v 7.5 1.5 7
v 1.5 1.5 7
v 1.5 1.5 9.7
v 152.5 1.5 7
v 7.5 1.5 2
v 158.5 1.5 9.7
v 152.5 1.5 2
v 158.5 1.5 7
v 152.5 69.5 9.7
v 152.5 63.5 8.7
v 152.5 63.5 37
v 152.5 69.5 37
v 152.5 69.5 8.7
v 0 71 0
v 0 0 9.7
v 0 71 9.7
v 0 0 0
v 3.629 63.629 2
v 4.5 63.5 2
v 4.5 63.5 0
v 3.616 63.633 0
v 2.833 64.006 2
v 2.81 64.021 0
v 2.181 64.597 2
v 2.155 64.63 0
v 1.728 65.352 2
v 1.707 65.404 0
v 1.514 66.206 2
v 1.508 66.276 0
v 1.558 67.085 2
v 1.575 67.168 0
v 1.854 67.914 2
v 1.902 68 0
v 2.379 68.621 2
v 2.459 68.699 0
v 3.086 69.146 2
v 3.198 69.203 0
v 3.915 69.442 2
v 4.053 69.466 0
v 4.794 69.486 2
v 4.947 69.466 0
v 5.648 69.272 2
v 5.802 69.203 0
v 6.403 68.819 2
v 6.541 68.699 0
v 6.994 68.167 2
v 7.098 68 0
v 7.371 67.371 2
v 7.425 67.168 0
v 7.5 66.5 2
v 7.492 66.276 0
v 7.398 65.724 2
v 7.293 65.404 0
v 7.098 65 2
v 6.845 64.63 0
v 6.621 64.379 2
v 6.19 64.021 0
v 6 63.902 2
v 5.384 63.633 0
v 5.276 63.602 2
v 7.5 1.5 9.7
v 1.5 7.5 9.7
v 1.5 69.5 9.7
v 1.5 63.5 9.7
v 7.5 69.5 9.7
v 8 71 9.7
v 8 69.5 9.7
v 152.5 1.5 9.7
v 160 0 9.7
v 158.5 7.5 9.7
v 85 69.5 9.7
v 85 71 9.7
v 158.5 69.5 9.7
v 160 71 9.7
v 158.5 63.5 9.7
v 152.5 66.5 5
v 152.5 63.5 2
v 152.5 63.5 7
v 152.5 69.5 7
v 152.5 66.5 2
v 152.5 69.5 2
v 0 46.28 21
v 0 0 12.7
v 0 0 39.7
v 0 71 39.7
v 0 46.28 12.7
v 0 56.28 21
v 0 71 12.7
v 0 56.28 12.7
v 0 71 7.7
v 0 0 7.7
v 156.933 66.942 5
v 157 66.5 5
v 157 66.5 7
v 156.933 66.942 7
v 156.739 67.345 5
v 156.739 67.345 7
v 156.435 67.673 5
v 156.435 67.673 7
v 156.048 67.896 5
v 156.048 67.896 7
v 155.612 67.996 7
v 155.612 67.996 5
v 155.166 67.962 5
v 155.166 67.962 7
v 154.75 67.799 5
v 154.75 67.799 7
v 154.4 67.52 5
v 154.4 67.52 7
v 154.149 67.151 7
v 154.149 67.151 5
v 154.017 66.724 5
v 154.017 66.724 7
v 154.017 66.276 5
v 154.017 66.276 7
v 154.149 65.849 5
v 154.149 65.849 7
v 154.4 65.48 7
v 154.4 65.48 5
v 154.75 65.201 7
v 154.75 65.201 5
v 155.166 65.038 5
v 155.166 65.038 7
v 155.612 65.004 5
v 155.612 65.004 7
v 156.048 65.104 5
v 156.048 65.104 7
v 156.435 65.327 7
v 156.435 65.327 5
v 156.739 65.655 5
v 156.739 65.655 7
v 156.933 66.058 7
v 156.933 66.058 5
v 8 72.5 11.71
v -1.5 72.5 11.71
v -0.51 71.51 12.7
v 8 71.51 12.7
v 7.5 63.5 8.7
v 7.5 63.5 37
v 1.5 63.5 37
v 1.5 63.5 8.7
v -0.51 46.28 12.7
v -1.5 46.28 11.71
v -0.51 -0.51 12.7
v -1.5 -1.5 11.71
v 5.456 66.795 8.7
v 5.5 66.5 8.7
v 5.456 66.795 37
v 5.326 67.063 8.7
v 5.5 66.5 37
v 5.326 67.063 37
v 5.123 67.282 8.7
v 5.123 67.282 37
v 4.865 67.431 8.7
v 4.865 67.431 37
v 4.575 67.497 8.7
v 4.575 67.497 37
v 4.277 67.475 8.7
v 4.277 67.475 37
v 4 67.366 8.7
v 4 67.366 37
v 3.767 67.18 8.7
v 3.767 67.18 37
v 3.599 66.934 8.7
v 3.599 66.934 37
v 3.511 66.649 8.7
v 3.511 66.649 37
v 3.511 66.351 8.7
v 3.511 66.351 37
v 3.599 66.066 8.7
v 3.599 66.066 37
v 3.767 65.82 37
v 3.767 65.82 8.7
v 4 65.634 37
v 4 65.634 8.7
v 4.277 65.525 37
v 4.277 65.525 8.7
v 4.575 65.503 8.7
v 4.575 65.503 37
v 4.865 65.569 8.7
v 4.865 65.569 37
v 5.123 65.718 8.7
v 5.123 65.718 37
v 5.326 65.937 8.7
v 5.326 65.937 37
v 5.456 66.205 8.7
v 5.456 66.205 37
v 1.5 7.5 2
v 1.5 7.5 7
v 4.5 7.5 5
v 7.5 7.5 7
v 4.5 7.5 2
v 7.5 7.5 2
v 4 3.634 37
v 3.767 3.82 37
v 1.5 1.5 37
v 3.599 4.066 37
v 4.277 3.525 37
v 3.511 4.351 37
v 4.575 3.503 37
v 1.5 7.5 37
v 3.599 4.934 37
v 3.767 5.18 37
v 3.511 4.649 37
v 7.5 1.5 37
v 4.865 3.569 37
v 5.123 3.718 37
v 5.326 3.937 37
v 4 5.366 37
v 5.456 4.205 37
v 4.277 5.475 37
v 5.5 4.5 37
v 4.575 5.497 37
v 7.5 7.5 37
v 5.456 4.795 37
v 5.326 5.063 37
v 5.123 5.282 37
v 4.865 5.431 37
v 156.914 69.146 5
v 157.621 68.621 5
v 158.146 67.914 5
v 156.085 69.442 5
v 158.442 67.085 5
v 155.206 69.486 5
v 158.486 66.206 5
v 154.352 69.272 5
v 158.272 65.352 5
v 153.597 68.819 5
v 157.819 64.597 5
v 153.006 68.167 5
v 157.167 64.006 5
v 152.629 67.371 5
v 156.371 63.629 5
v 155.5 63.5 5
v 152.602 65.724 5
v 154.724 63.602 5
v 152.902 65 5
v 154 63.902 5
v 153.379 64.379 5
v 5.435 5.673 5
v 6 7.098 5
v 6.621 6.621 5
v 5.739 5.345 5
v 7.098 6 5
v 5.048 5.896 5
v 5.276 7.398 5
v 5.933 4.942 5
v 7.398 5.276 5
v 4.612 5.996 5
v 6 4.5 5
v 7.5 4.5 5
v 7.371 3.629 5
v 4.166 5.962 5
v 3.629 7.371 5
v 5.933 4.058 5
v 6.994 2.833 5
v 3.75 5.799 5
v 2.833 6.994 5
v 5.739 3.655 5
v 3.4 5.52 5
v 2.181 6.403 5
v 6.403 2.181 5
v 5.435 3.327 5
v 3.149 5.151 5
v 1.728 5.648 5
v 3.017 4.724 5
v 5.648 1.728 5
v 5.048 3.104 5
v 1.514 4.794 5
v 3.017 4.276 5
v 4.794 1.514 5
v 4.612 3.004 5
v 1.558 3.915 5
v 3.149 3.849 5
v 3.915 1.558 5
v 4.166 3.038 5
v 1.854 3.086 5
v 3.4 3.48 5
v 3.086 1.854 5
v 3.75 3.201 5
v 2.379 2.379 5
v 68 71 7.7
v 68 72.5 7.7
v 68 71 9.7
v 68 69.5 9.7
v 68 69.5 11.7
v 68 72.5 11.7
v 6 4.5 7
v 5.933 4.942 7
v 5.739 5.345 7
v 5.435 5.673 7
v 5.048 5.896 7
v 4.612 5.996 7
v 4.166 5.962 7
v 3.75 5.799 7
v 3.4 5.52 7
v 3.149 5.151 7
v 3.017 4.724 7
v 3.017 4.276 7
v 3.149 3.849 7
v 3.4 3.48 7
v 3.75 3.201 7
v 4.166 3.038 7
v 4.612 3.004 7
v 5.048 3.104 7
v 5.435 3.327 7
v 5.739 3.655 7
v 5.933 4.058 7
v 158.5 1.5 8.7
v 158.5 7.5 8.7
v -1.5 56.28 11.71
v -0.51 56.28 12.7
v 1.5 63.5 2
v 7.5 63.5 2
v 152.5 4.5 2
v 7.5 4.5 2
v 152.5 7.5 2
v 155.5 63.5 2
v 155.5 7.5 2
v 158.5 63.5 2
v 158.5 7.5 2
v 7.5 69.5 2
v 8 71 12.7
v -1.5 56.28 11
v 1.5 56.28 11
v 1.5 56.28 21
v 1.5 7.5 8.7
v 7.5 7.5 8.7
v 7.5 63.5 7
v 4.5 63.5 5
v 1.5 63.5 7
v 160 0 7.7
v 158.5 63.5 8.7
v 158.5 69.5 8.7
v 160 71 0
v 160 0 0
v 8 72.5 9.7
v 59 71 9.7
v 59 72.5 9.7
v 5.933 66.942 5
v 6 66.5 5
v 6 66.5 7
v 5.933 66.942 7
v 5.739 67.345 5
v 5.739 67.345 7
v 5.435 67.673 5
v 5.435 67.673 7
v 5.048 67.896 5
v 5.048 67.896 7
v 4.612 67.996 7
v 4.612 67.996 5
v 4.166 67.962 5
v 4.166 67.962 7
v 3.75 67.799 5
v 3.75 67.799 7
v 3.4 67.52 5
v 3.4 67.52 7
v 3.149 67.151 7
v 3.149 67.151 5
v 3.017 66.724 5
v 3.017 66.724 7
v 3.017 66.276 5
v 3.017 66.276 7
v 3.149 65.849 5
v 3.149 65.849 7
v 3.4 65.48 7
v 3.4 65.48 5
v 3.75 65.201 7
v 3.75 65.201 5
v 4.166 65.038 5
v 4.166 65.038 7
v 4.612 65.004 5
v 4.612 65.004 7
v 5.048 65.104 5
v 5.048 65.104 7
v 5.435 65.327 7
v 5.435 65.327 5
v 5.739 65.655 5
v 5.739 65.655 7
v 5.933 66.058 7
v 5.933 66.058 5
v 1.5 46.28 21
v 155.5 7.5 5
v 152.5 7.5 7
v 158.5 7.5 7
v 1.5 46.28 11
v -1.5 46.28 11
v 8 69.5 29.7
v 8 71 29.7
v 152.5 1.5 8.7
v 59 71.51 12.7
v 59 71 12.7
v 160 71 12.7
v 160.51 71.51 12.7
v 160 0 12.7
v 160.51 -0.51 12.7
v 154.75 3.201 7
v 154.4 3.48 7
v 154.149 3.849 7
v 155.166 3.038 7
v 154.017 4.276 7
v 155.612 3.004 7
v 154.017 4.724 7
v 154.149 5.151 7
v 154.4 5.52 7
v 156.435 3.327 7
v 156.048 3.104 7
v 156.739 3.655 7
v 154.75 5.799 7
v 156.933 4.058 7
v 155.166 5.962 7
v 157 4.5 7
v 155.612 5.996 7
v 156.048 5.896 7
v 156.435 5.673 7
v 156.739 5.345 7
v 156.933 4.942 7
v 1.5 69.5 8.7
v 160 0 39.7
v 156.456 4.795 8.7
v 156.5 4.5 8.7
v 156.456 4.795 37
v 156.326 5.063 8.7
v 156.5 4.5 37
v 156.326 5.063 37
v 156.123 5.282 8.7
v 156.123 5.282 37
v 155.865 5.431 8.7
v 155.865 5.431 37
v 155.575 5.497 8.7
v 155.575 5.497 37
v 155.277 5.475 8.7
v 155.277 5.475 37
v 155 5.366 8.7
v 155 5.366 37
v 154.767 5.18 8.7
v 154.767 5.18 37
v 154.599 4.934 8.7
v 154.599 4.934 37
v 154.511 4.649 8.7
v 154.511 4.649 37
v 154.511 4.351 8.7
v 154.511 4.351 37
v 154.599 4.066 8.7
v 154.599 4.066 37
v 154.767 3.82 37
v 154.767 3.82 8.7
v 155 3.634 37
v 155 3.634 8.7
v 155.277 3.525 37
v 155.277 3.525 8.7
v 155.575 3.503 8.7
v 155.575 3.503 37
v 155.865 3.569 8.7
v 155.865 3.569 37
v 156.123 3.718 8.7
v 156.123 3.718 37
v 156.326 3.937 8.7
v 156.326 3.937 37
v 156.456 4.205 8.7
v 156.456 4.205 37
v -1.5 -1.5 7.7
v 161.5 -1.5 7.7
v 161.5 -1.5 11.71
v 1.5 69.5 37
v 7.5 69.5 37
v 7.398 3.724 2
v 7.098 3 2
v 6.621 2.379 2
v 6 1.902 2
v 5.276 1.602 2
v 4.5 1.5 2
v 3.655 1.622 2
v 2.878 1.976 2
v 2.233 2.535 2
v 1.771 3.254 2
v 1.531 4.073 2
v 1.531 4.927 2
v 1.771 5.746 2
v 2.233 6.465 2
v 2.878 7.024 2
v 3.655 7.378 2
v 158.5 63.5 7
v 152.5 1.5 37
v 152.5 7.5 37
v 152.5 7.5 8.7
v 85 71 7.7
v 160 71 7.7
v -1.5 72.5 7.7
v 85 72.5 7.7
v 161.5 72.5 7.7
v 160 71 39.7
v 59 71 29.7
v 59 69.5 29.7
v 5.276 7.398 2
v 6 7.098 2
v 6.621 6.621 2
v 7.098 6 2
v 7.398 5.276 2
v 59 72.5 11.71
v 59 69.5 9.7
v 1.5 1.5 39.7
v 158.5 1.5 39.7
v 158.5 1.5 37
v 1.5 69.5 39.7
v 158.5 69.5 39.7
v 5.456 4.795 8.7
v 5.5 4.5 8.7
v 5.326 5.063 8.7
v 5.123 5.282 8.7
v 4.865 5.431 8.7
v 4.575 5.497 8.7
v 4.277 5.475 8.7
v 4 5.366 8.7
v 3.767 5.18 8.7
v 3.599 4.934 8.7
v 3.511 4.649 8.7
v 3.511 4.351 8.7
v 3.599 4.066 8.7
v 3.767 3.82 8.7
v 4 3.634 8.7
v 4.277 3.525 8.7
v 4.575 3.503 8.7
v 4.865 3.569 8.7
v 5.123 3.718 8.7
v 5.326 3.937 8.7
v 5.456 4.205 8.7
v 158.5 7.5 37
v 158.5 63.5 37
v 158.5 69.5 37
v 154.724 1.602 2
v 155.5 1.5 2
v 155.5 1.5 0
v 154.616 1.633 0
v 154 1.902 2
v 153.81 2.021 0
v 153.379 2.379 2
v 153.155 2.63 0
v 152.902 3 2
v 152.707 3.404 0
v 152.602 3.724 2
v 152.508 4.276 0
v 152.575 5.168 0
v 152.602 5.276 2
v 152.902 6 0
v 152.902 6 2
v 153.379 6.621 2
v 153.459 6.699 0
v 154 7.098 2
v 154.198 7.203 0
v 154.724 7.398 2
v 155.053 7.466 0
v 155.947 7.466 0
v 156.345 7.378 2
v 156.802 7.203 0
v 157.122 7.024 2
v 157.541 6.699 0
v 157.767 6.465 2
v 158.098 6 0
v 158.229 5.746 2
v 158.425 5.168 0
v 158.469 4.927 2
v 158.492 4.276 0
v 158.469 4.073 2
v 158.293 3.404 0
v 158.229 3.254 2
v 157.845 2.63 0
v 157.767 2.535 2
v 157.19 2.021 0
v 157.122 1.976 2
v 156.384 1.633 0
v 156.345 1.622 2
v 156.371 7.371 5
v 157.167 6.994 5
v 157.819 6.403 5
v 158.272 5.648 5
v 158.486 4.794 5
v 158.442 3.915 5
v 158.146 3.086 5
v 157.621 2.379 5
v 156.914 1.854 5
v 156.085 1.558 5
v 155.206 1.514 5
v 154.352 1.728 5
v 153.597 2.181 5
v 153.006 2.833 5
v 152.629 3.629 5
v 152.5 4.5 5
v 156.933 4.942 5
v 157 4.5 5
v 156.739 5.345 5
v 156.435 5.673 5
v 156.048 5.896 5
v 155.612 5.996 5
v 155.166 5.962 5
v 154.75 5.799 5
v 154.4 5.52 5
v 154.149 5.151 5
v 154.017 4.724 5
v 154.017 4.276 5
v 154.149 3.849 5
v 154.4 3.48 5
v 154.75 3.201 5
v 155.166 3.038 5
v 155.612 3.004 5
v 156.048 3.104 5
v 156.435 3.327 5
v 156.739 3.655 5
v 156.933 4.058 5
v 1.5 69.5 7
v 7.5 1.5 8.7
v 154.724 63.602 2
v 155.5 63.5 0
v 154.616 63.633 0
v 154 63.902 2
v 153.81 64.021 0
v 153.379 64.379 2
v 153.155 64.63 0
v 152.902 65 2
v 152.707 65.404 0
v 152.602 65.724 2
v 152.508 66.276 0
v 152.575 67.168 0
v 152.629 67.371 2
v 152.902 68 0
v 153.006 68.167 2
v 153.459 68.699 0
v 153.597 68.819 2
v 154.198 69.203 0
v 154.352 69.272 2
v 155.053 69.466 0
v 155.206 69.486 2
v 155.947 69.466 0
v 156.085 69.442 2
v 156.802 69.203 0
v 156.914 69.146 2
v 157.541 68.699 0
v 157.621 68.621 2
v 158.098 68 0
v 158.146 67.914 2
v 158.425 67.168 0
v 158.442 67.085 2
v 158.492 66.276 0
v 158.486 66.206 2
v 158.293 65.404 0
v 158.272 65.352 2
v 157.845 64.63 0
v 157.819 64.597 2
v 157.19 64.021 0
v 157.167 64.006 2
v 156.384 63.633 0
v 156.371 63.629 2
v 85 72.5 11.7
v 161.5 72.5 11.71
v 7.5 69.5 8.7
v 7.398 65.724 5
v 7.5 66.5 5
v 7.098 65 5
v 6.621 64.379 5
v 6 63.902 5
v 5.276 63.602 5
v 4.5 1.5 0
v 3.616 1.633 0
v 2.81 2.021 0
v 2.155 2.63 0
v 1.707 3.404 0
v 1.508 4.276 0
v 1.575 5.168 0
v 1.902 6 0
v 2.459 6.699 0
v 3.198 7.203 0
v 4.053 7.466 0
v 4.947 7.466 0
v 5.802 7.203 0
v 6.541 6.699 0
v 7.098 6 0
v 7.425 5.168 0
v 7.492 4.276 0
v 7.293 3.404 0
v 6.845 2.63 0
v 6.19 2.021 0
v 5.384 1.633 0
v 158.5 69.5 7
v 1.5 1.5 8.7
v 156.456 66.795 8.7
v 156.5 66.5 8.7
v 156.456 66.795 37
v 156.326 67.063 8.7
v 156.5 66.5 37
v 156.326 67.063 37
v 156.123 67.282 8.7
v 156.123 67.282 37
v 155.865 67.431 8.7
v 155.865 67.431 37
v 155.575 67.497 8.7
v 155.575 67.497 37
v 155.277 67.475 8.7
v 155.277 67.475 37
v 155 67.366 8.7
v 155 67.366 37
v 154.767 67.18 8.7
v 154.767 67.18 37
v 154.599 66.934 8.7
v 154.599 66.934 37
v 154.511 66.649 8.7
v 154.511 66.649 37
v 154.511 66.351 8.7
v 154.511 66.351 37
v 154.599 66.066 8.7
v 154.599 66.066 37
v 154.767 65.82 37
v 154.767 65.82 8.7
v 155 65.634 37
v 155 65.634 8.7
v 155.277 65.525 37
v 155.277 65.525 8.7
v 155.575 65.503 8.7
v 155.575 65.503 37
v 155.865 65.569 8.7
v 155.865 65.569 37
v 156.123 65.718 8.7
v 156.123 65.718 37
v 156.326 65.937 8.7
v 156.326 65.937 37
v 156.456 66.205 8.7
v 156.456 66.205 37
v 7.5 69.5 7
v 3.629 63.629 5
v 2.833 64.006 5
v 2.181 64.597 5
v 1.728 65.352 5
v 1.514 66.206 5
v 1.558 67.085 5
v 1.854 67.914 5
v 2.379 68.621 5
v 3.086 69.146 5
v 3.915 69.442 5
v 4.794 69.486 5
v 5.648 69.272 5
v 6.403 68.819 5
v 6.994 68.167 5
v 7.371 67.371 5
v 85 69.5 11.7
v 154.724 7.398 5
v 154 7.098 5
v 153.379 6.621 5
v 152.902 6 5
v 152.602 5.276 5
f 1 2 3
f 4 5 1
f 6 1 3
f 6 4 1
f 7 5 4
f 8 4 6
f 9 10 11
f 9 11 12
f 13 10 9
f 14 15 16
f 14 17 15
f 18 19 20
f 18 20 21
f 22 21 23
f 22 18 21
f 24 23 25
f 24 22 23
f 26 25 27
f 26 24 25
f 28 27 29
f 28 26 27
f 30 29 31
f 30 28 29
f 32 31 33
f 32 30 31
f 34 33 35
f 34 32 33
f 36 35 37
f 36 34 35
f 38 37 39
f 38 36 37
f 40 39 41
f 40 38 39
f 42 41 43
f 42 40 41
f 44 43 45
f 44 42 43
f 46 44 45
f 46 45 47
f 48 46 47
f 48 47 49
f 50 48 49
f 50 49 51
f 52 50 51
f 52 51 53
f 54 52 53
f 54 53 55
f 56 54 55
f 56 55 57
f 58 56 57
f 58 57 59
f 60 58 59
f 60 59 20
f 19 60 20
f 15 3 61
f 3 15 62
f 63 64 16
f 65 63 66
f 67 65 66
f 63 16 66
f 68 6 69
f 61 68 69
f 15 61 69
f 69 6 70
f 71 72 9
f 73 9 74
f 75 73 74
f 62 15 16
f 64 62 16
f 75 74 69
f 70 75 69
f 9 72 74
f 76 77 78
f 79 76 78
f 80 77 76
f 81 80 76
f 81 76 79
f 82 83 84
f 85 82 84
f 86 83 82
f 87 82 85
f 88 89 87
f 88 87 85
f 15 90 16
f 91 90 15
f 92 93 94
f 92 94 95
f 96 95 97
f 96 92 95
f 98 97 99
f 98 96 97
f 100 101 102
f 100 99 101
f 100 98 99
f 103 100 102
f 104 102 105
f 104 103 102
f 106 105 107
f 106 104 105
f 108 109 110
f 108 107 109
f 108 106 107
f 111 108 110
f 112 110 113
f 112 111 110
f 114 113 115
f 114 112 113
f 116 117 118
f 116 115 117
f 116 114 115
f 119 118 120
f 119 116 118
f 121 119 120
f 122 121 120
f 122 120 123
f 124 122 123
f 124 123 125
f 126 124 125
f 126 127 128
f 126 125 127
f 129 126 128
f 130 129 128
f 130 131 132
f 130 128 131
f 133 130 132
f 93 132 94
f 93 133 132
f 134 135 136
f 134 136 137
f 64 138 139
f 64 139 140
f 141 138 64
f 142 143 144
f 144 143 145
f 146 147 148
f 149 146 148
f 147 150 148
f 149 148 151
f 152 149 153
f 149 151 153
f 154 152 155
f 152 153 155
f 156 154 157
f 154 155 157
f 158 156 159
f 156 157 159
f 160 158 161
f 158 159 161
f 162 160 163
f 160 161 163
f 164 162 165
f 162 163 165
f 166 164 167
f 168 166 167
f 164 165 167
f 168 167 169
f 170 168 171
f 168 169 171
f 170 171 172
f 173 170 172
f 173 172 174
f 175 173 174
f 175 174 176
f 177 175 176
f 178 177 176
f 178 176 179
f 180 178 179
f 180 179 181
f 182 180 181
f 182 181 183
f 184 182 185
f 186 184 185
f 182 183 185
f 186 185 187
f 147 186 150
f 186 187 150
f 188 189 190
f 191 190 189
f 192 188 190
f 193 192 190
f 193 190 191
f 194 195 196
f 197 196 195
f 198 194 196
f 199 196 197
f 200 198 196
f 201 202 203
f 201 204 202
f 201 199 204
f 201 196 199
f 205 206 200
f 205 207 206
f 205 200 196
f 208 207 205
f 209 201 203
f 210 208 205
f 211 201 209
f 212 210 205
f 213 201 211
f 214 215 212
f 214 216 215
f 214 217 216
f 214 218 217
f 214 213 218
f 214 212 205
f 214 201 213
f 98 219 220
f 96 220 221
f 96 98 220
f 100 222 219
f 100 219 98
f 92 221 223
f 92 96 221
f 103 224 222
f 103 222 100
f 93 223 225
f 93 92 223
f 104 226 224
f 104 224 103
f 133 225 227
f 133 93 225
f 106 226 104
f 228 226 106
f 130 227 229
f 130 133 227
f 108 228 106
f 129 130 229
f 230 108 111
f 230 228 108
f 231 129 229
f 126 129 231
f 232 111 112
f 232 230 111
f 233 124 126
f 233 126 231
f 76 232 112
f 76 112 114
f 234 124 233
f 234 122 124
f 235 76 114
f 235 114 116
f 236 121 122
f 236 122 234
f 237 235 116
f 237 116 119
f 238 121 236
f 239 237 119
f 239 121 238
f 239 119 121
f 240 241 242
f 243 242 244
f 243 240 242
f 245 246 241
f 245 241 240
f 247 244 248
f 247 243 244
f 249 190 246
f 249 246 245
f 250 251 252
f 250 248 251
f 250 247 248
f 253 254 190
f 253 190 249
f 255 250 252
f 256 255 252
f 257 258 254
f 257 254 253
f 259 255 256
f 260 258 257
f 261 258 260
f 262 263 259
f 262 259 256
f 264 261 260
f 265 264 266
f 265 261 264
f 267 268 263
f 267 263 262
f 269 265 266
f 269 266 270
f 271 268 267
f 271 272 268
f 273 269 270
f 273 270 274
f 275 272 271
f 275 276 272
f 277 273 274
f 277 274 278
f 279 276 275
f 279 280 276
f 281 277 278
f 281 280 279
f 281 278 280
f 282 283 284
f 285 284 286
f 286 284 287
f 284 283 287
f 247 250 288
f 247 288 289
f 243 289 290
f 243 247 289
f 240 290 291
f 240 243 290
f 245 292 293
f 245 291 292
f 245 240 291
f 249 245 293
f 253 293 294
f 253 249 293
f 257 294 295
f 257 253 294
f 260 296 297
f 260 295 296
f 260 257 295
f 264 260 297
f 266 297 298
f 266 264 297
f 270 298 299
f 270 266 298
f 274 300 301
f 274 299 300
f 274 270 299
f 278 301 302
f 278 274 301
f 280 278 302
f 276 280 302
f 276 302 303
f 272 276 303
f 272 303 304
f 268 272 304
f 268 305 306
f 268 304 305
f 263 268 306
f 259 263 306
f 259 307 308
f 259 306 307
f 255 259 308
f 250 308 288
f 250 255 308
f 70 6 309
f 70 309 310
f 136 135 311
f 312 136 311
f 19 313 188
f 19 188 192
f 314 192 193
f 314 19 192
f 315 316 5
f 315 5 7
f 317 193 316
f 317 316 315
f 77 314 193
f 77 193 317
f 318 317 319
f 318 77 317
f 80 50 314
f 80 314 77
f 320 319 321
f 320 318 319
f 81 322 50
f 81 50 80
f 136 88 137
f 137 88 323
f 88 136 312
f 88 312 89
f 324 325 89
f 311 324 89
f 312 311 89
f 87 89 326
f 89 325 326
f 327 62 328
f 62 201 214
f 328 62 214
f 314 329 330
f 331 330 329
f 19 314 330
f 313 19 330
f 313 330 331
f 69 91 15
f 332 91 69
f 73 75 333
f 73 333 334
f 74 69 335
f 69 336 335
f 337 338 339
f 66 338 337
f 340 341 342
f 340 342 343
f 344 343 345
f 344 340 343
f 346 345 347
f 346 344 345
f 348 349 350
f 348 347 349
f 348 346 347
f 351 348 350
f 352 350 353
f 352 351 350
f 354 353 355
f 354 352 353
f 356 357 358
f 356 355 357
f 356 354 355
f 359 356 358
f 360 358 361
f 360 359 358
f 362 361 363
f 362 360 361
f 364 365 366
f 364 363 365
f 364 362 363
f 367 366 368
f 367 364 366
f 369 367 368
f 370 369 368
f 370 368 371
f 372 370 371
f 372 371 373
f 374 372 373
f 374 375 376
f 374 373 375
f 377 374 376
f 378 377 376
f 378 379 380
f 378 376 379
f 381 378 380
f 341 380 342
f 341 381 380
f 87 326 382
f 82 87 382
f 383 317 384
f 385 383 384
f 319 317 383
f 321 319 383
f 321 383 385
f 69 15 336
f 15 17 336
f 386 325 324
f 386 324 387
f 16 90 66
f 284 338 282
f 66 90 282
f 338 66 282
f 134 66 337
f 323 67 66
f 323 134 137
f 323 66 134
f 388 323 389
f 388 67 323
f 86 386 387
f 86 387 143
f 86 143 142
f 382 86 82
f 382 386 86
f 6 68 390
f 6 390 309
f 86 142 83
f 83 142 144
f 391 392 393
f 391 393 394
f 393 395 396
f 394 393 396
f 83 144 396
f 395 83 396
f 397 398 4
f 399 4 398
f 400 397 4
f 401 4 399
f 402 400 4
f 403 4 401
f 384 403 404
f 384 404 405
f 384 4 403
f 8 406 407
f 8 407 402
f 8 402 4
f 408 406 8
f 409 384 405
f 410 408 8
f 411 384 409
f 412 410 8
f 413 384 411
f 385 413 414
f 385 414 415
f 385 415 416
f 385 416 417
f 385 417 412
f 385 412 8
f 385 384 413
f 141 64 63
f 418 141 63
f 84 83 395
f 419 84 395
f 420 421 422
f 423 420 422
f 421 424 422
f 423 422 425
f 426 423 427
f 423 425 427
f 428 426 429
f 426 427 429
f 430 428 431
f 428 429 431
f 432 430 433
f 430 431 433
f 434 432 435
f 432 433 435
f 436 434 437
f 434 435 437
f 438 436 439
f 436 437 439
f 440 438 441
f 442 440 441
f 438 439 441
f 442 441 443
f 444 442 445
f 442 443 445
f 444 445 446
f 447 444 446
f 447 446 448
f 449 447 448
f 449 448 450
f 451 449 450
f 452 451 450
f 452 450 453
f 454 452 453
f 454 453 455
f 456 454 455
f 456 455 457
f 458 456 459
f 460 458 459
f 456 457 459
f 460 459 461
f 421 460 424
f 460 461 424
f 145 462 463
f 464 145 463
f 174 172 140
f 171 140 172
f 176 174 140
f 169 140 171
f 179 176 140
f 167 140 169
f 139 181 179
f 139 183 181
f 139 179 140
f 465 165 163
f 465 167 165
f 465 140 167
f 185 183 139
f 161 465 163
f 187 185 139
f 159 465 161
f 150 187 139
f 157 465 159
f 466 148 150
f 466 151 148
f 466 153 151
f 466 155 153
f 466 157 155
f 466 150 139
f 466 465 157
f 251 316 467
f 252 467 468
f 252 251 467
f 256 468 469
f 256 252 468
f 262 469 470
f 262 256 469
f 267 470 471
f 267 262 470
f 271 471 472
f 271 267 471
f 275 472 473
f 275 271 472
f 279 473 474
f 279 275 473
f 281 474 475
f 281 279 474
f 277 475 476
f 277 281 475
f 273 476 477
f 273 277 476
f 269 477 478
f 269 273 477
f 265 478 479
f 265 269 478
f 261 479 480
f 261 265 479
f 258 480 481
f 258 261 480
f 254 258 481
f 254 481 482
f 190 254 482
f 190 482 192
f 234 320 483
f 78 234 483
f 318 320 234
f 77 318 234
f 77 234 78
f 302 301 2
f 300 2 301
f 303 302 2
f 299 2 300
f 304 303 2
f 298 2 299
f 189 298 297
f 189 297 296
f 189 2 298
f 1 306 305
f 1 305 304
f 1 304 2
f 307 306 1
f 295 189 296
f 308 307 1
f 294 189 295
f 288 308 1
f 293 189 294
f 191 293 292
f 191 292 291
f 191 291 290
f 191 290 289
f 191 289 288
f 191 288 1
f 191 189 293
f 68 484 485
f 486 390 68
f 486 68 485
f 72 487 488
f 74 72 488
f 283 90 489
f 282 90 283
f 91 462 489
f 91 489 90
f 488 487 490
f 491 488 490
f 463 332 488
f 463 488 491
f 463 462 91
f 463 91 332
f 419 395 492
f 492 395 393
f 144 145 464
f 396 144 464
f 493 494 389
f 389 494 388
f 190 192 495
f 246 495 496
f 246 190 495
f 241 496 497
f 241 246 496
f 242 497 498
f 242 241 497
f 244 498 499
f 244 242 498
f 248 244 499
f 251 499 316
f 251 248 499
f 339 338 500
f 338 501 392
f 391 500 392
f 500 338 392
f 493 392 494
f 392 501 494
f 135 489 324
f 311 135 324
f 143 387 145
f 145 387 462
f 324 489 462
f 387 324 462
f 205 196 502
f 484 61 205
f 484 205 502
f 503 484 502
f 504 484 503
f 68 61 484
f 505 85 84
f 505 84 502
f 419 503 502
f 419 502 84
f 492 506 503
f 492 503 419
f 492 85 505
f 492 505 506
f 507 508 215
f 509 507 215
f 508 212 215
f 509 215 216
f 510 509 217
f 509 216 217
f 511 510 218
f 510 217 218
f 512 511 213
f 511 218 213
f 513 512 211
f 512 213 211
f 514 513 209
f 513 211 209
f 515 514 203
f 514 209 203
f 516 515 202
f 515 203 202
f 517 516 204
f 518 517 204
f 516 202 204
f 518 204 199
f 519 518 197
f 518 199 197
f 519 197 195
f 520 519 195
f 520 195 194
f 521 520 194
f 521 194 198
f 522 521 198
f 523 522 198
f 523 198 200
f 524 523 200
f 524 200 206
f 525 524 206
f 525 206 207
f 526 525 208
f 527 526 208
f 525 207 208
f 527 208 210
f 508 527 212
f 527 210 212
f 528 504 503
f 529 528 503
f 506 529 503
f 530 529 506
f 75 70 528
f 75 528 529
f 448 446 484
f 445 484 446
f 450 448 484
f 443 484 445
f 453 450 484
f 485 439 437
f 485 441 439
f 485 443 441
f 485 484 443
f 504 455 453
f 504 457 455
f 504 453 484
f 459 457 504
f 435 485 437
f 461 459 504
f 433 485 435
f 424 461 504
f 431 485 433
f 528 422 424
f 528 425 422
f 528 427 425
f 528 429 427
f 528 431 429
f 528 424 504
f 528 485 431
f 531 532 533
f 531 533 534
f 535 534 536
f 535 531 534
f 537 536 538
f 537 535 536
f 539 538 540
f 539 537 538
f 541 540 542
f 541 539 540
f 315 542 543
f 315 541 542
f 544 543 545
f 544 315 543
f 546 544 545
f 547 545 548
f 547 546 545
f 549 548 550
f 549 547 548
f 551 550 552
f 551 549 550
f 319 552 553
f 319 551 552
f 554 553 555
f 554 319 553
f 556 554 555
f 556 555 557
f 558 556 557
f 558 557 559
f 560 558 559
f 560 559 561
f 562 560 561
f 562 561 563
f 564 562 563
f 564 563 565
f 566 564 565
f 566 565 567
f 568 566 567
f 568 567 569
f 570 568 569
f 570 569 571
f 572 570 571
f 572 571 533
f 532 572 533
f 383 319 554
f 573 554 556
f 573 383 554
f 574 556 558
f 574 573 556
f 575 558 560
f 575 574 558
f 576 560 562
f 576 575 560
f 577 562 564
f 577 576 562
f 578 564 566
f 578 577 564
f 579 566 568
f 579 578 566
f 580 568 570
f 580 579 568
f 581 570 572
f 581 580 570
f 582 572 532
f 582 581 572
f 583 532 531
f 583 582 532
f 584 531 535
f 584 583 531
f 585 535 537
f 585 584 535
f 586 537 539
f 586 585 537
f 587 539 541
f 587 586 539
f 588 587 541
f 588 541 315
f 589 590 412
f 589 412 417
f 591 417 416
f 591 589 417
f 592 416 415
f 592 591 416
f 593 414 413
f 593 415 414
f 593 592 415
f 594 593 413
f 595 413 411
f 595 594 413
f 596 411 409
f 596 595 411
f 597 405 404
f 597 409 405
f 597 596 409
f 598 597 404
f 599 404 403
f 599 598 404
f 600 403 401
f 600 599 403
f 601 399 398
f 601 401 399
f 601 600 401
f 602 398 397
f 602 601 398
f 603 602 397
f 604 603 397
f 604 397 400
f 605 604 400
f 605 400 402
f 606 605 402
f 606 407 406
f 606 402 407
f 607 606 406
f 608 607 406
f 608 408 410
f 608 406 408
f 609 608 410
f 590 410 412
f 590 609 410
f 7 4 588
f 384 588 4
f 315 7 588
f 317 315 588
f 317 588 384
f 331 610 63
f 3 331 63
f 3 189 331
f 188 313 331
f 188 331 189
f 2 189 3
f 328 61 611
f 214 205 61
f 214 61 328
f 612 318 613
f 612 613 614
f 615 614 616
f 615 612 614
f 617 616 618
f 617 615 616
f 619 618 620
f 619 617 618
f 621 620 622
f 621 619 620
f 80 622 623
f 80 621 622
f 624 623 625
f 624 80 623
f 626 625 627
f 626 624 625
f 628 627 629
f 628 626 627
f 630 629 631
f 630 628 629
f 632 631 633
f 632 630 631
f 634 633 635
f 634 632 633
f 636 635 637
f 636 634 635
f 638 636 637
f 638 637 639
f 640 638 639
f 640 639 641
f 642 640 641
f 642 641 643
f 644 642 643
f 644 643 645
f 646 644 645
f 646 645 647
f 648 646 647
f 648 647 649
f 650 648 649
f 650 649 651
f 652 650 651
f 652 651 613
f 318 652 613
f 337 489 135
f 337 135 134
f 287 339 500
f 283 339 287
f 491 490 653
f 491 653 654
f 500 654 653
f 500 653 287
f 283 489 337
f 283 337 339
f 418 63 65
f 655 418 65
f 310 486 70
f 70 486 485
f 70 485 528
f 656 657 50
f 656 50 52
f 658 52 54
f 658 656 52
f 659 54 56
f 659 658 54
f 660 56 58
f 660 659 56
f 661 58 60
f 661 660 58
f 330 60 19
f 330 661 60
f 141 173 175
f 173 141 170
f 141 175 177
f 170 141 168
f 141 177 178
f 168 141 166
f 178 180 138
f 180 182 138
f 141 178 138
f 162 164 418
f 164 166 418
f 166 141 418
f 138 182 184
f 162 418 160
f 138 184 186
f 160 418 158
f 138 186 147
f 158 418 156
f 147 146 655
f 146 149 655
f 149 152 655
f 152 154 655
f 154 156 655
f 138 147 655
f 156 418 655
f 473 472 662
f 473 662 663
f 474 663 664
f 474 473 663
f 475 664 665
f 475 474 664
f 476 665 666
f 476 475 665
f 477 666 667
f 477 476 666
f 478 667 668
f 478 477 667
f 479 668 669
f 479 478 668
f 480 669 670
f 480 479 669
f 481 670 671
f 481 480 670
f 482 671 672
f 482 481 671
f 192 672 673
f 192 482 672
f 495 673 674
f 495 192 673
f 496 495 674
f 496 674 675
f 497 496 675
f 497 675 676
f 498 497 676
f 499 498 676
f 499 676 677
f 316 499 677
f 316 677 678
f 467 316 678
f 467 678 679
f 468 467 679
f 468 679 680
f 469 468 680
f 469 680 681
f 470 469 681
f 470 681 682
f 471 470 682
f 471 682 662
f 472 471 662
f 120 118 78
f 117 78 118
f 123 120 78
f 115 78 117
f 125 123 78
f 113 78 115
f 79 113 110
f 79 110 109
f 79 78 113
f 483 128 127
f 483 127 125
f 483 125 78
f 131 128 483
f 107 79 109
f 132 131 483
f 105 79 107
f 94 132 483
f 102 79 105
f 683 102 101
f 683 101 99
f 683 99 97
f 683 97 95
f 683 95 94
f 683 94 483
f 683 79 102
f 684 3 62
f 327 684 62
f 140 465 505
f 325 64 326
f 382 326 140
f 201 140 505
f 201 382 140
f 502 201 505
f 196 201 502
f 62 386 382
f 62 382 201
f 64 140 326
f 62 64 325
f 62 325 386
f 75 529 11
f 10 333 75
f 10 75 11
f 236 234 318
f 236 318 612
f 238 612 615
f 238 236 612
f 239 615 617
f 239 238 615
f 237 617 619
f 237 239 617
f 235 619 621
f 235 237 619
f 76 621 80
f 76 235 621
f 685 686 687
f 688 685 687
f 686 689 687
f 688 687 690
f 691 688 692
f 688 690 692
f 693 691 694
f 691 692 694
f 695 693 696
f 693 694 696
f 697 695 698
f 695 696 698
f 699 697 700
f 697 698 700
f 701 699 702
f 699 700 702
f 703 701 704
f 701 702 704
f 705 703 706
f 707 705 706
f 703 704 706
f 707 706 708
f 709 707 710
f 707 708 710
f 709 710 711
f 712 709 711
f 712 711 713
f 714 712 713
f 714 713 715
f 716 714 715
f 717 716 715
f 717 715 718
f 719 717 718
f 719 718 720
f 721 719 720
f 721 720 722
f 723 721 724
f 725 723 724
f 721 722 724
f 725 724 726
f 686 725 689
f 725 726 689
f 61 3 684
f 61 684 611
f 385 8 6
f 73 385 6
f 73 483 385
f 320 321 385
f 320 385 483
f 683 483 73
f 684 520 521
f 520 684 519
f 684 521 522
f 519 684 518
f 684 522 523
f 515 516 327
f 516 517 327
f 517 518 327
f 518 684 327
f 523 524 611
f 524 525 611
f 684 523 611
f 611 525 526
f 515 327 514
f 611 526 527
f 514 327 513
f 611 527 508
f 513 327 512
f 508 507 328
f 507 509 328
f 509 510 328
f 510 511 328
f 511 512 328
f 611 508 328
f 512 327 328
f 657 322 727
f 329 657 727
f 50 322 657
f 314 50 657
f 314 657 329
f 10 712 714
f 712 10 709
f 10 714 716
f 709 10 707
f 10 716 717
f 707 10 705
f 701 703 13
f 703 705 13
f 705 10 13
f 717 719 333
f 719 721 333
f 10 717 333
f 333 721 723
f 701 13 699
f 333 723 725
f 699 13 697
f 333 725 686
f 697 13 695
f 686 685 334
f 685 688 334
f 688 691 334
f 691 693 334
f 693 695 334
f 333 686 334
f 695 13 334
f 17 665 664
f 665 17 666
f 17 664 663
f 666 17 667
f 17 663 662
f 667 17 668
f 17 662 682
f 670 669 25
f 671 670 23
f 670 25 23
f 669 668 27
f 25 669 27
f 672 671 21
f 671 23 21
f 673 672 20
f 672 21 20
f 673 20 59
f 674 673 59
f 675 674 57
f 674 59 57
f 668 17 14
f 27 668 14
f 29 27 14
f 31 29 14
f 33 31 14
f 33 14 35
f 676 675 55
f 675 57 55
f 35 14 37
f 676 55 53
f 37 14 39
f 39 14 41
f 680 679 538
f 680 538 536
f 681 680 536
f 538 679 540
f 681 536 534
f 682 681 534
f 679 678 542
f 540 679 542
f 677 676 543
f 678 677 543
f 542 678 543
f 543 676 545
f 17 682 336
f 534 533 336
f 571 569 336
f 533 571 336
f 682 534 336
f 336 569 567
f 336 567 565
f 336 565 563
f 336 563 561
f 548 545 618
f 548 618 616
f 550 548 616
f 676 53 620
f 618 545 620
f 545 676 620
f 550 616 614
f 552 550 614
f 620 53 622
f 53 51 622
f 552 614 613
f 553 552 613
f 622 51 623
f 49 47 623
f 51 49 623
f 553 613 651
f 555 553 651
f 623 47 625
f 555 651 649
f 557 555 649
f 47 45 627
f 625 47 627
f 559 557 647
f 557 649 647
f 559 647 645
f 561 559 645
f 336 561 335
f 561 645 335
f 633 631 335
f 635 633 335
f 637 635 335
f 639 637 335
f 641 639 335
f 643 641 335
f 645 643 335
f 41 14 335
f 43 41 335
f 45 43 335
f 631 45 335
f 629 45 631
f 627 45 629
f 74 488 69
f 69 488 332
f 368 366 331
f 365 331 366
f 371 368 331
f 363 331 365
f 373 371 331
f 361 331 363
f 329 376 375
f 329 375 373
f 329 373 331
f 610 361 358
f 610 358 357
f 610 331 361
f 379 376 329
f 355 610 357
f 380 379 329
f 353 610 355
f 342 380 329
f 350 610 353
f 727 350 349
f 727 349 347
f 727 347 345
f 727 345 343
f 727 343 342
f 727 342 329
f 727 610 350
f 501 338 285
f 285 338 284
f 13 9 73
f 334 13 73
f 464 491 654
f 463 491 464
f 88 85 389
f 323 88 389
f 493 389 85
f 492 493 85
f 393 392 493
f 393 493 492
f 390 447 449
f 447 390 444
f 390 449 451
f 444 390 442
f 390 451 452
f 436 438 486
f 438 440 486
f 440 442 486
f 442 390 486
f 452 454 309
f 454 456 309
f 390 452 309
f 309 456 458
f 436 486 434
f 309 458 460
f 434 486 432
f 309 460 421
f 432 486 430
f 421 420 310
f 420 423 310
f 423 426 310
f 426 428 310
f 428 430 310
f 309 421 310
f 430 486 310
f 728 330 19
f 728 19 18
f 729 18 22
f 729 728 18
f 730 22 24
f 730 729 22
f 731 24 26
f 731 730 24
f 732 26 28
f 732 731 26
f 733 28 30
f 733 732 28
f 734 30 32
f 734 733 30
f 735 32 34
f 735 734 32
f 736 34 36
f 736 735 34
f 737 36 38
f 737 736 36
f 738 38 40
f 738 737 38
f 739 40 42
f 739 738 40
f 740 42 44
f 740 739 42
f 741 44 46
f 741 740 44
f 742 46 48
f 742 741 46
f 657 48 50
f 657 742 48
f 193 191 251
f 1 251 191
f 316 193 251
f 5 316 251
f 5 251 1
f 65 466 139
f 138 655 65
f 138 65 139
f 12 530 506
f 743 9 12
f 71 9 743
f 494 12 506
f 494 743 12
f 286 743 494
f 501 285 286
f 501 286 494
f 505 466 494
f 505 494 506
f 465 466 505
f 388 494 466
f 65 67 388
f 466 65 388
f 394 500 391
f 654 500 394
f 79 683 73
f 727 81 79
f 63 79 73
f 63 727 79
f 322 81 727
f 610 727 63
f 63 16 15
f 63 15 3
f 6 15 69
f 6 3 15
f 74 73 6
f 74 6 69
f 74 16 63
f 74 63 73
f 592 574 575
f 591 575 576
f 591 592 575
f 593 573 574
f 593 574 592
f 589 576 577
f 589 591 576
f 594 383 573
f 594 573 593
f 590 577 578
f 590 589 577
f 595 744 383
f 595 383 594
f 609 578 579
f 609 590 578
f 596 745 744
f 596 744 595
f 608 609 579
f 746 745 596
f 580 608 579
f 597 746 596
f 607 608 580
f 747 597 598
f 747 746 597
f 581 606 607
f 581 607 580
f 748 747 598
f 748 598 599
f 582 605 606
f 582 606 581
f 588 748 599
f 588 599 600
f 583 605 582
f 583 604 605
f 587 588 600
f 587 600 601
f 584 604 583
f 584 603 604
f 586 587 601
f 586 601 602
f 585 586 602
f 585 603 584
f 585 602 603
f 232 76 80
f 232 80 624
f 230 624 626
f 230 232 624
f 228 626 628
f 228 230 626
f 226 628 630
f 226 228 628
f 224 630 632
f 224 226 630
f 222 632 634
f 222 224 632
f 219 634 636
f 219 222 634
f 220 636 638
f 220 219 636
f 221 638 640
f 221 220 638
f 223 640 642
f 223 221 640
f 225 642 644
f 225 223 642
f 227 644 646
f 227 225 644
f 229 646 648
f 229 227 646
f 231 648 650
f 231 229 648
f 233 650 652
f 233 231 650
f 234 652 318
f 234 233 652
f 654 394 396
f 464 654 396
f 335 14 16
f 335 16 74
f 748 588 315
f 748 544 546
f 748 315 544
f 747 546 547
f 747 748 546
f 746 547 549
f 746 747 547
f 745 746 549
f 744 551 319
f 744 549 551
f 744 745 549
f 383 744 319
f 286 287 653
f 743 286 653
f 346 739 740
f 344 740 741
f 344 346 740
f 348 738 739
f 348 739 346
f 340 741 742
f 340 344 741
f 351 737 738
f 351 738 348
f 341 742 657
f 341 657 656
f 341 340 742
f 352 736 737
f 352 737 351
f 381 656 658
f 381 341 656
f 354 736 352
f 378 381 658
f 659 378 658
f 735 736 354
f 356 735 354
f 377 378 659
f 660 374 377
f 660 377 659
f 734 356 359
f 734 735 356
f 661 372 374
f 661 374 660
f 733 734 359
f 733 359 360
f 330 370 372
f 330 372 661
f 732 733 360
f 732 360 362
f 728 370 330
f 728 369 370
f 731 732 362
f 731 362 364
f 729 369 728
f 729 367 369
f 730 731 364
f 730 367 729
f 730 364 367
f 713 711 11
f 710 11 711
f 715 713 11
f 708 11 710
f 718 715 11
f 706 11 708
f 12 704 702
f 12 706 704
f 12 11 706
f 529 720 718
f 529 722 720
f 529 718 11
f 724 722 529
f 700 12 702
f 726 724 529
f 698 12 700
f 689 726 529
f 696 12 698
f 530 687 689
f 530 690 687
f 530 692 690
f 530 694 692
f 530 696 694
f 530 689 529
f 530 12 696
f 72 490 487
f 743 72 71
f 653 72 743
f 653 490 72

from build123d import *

# Parameters (mm, degrees)
CYLINDER001_R         = 3
CYLINDER001_DEPTH     = 5
CYLINDER002_R         = 3
CYLINDER002_DEPTH     = 5
CYLINDER003_R         = 3
CYLINDER003_DEPTH     = 5
CYLINDER_R            = 3
CYLINDER_DEPTH        = 5
SKETCH002_W           = 6
SKETCH002_H           = 6
EXTRUDE001_DEPTH      = 2.7
SKETCH001_W           = 160
SKETCH001_H           = 71
SKETCH001_R           = 1.5
EXTRUDE_DEPTH         = 7.7
BOX_W                 = 160
BOX_H                 = 71
BOX_DEPTH             = 2
BOX002_W              = 51
BOX002_H              = 20
BOX002_DEPTH          = 3
BOX003_W              = 17
BOX003_H              = 4
BOX003_DEPTH          = 3
SKETCH004_W           = 6
SKETCH004_H           = 6
SKETCH004_R           = 1
EXTRUDE004_DEPTH      = 2.7
BOX001_W              = 10
BOX001_H              = 10
BOX001_DEPTH          = 3
SKETCH005_W           = 163
SKETCH005_H           = 74
SKETCH005_W_2         = 160
SKETCH005_H_2         = 71
EXTRUDE005_DEPTH      = 2
EXTRUDE005_DEPTH_BACK = 3
EXTRUDE003_DEPTH      = 1
SKETCH003_W           = 160
SKETCH003_H           = 71
SKETCH003_R           = 1
EXTRUDE002_DEPTH      = 30
CHAMFER_SIZE          = 0.99


with BuildPart() as case_bottom_left_top_screwhole:
    # Cylinder001 → Cylinder001 (new body)
    with BuildSketch(Plane(origin=(4.5, 66.5, 5), x_dir=(0, -1, 0), z_dir=(0, 0, -1))):
        Circle(CYLINDER001_R)
    extrude(amount=CYLINDER001_DEPTH)


with BuildPart() as case_bottom_right_top_screwhole:
    # Cylinder002 → Cylinder002 (new body)
    with BuildSketch(Plane(origin=(155.5, 66.5, 5), x_dir=(0, -1, 0), z_dir=(0, 0, -1))):
        Circle(CYLINDER002_R)
    extrude(amount=CYLINDER002_DEPTH)


with BuildPart() as case_bottom_right_bottom_screwhole:
    # Cylinder003 → Cylinder003 (new body)
    with BuildSketch(Plane(origin=(155.5, 4.5, 5), x_dir=(0, -1, 0), z_dir=(0, 0, -1))):
        Circle(CYLINDER003_R)
    extrude(amount=CYLINDER003_DEPTH)


with BuildPart() as case_bottom_screw_insets:
    # Cylinder → Cylinder (new body)
    with BuildSketch(Plane(origin=(4.5, 4.5, 5), x_dir=(0, -1, 0), z_dir=(0, 0, -1))):
        Circle(CYLINDER_R)
    extrude(amount=CYLINDER_DEPTH)

    # Fusion001: union case-bottom-left-top-screwhole, case-bottom-right-top-screwhole, case-bottom-right-bottom-screwhole
    add(case_bottom_left_top_screwhole.part)
    add(case_bottom_right_top_screwhole.part)
    add(case_bottom_right_bottom_screwhole.part)


with BuildPart() as mount_hole_removed:
    # Sketch002 (on Face22 of Extrude) → Extrude001 (new body)
    with BuildSketch(Plane.XY.offset(9.7)):
        with Locations((4.5, 66.5)):
            Rectangle(SKETCH002_W, SKETCH002_H)
        with Locations((155.5, 66.5)):
            Rectangle(SKETCH002_W, SKETCH002_H)
        with Locations((4.5, 4.5)):
            Rectangle(SKETCH002_W, SKETCH002_H)
        with Locations((155.5, 4.5)):
            Rectangle(SKETCH002_W, SKETCH002_H)
    extrude(amount=-EXTRUDE001_DEPTH)


with BuildPart() as case_bottom_wall_with_screw_insets:
    # Sketch001 (on Face6 of Box) → Extrude (new body)
    with BuildSketch(Plane.XY.offset(2)):
        with Locations((80, 35.5)):
            Rectangle(SKETCH001_W, SKETCH001_H)
        with Locations((4.5, 66.5)):
            Circle(SKETCH001_R, mode=Mode.SUBTRACT)
        with Locations((155.5, 66.5)):
            Circle(SKETCH001_R, mode=Mode.SUBTRACT)
        with Locations((155.5, 4.5)):
            Circle(SKETCH001_R, mode=Mode.SUBTRACT)
        with Locations((4.5, 4.5)):
            Circle(SKETCH001_R, mode=Mode.SUBTRACT)
        Polygon((152.5, 69.5), (7.5, 69.5), (7.5, 63.5), (1.5, 63.5), (1.5, 7.5), (7.5, 7.5), (7.5, 1.5), (152.5, 1.5), (152.5, 7.5), (158.5, 7.5), (158.5, 63.5), (152.5, 63.5), align=None, mode=Mode.SUBTRACT)
    extrude(amount=EXTRUDE_DEPTH)

    # Cut: cut mount-hole-removed
    add(mount_hole_removed.part, mode=Mode.SUBTRACT)

    # Cut002: cut case-bottom-screw-insets
    add(case_bottom_screw_insets.part, mode=Mode.SUBTRACT)


with BuildPart() as case_bottom:
    # Box → Box (new body)
    with BuildSketch(Plane.XY):
        with Locations((80, 35.5)):
            Rectangle(BOX_W, BOX_H)
    extrude(amount=BOX_DEPTH)

    # Cut001: cut case-bottom-screw-insets
    add(case_bottom_screw_insets.part, mode=Mode.SUBTRACT)

    # Fusion: union case-bottom-wall-with-screw-insets
    add(case_bottom_wall_with_screw_insets.part)


with BuildPart() as back_panel_cutout:
    # Box002 → Box002 (new body)
    with BuildSketch(Plane(origin=(59, 69.5, 9.7), x_dir=(-1, 0, 0), z_dir=(0, 1, 0))):
        with Locations((25.5, 10)):
            Rectangle(BOX002_W, BOX002_H)
    extrude(amount=BOX002_DEPTH)


with BuildPart() as ribbon_cable_cutout:
    # Box003 → Box003 (new body)
    with BuildSketch(Plane(origin=(68, 72.5, 7.7), x_dir=(1, 0, 0), z_dir=(0, -1, 0))):
        with Locations((8.5, 2)):
            Rectangle(BOX003_W, BOX003_H)
    extrude(amount=BOX003_DEPTH)


with BuildPart() as top_board_screw_backoff:
    # Sketch004 (on Face9 of Fusion) → Extrude004 (new body)
    with BuildSketch(Plane.XY.offset(9.7)):
        with Locations((155.5, 66.5)):
            Rectangle(SKETCH004_W, SKETCH004_H)
        with Locations((155.5, 66.5)):
            Circle(SKETCH004_R, mode=Mode.SUBTRACT)
        with Locations((155.5, 4.5)):
            Rectangle(SKETCH004_W, SKETCH004_H)
        with Locations((155.5, 4.5)):
            Circle(SKETCH004_R, mode=Mode.SUBTRACT)
        with Locations((4.5, 66.5)):
            Rectangle(SKETCH004_W, SKETCH004_H)
        with Locations((4.5, 66.5)):
            Circle(SKETCH004_R, mode=Mode.SUBTRACT)
        with Locations((4.5, 4.5)):
            Rectangle(SKETCH004_W, SKETCH004_H)
        with Locations((4.5, 4.5)):
            Circle(SKETCH004_R, mode=Mode.SUBTRACT)
    extrude(amount=-EXTRUDE004_DEPTH)


with BuildPart() as top_board_screw_backoff_1:
    # Extrude004 placement: moved
    add(top_board_screw_backoff.part.moved(Location((0, 0, 30))))


with BuildPart() as top_wall_cutouts:
    # Box001 → Box001 (new body)
    with BuildSketch(Plane(origin=(1.5, 56.28, 11), x_dir=(0, -1, 0), z_dir=(-1, 0, 0))):
        with Locations((5, 5)):
            Rectangle(BOX001_W, BOX001_H)
    extrude(amount=BOX001_DEPTH)

    # Fusion002: union back-panel-cutout, ribbon-cable-cutout, top-board-screw-backoff
    add(back_panel_cutout.part)
    add(ribbon_cable_cutout.part)
    add(top_board_screw_backoff_1.part)


with BuildPart() as top_wall_surround:
    # Sketch005 → Extrude005 (new body, two sides)
    with BuildSketch(Plane(origin=(0, 0, 9.7), x_dir=(1, 0, 0), z_dir=(0, 0, -1))) as extrude005_sk:
        with Locations((80, -35.5)):
            Rectangle(SKETCH005_W, SKETCH005_H)
        with Locations((80, -35.5)):
            Rectangle(SKETCH005_W_2, SKETCH005_H_2, mode=Mode.SUBTRACT)
    extrude(amount=EXTRUDE005_DEPTH)
    extrude(extrude005_sk.sketch, amount=-EXTRUDE005_DEPTH_BACK)


with BuildPart() as top_walls_protrusion:
    # Sketch004 (on Face9 of Fusion) → Extrude003 (new body)
    with BuildSketch(Plane.XY.offset(9.7)):
        with Locations((155.5, 66.5)):
            Rectangle(SKETCH004_W, SKETCH004_H)
        with Locations((155.5, 66.5)):
            Circle(SKETCH004_R, mode=Mode.SUBTRACT)
        with Locations((155.5, 4.5)):
            Rectangle(SKETCH004_W, SKETCH004_H)
        with Locations((155.5, 4.5)):
            Circle(SKETCH004_R, mode=Mode.SUBTRACT)
        with Locations((4.5, 66.5)):
            Rectangle(SKETCH004_W, SKETCH004_H)
        with Locations((4.5, 66.5)):
            Circle(SKETCH004_R, mode=Mode.SUBTRACT)
        with Locations((4.5, 4.5)):
            Rectangle(SKETCH004_W, SKETCH004_H)
        with Locations((4.5, 4.5)):
            Circle(SKETCH004_R, mode=Mode.SUBTRACT)
    extrude(amount=-EXTRUDE003_DEPTH)


with BuildPart() as top_wall:
    # Sketch003 (on Face9 of Fusion) → Extrude002 (new body)
    with BuildSketch(Plane.XY.offset(9.7)):
        with Locations((80, 35.5)):
            Rectangle(SKETCH003_W, SKETCH003_H)
        with Locations((4.5, 66.5)):
            Circle(SKETCH003_R, mode=Mode.SUBTRACT)
        with Locations((155.5, 66.5)):
            Circle(SKETCH003_R, mode=Mode.SUBTRACT)
        with Locations((155.5, 4.5)):
            Circle(SKETCH003_R, mode=Mode.SUBTRACT)
        with Locations((4.5, 4.5)):
            Circle(SKETCH003_R, mode=Mode.SUBTRACT)
        Polygon((152.5, 69.5), (7.5, 69.5), (7.5, 63.5), (1.5, 63.5), (1.5, 7.5), (7.5, 7.5), (7.5, 1.5), (152.5, 1.5), (152.5, 7.5), (158.5, 7.5), (158.5, 63.5), (152.5, 63.5), align=None, mode=Mode.SUBTRACT)
    extrude(amount=EXTRUDE002_DEPTH)

    # Fusion004: union top-wall-surround, top-walls-protrusion
    add(top_wall_surround.part)
    add(top_walls_protrusion.part)

    # Cut003: cut top-wall-cutouts
    add(top_wall_cutouts.part, mode=Mode.SUBTRACT)

    # Chamfer
    chamfer_edges = [top_wall.edges().sort_by_distance(p)[0] for p in [
        (110.25, 72.5, 12.7),
        (161.5, 35.5, 12.7),
        (80, -1.5, 12.7),
        (-1.5, 22.39, 12.7),
        (3.25, 72.5, 12.7),
        (-1.5, 64.39, 12.7),
    ]]
    chamfer(chamfer_edges, length=CHAMFER_SIZE)


solid = Compound([case_bottom.part, top_wall.part])
